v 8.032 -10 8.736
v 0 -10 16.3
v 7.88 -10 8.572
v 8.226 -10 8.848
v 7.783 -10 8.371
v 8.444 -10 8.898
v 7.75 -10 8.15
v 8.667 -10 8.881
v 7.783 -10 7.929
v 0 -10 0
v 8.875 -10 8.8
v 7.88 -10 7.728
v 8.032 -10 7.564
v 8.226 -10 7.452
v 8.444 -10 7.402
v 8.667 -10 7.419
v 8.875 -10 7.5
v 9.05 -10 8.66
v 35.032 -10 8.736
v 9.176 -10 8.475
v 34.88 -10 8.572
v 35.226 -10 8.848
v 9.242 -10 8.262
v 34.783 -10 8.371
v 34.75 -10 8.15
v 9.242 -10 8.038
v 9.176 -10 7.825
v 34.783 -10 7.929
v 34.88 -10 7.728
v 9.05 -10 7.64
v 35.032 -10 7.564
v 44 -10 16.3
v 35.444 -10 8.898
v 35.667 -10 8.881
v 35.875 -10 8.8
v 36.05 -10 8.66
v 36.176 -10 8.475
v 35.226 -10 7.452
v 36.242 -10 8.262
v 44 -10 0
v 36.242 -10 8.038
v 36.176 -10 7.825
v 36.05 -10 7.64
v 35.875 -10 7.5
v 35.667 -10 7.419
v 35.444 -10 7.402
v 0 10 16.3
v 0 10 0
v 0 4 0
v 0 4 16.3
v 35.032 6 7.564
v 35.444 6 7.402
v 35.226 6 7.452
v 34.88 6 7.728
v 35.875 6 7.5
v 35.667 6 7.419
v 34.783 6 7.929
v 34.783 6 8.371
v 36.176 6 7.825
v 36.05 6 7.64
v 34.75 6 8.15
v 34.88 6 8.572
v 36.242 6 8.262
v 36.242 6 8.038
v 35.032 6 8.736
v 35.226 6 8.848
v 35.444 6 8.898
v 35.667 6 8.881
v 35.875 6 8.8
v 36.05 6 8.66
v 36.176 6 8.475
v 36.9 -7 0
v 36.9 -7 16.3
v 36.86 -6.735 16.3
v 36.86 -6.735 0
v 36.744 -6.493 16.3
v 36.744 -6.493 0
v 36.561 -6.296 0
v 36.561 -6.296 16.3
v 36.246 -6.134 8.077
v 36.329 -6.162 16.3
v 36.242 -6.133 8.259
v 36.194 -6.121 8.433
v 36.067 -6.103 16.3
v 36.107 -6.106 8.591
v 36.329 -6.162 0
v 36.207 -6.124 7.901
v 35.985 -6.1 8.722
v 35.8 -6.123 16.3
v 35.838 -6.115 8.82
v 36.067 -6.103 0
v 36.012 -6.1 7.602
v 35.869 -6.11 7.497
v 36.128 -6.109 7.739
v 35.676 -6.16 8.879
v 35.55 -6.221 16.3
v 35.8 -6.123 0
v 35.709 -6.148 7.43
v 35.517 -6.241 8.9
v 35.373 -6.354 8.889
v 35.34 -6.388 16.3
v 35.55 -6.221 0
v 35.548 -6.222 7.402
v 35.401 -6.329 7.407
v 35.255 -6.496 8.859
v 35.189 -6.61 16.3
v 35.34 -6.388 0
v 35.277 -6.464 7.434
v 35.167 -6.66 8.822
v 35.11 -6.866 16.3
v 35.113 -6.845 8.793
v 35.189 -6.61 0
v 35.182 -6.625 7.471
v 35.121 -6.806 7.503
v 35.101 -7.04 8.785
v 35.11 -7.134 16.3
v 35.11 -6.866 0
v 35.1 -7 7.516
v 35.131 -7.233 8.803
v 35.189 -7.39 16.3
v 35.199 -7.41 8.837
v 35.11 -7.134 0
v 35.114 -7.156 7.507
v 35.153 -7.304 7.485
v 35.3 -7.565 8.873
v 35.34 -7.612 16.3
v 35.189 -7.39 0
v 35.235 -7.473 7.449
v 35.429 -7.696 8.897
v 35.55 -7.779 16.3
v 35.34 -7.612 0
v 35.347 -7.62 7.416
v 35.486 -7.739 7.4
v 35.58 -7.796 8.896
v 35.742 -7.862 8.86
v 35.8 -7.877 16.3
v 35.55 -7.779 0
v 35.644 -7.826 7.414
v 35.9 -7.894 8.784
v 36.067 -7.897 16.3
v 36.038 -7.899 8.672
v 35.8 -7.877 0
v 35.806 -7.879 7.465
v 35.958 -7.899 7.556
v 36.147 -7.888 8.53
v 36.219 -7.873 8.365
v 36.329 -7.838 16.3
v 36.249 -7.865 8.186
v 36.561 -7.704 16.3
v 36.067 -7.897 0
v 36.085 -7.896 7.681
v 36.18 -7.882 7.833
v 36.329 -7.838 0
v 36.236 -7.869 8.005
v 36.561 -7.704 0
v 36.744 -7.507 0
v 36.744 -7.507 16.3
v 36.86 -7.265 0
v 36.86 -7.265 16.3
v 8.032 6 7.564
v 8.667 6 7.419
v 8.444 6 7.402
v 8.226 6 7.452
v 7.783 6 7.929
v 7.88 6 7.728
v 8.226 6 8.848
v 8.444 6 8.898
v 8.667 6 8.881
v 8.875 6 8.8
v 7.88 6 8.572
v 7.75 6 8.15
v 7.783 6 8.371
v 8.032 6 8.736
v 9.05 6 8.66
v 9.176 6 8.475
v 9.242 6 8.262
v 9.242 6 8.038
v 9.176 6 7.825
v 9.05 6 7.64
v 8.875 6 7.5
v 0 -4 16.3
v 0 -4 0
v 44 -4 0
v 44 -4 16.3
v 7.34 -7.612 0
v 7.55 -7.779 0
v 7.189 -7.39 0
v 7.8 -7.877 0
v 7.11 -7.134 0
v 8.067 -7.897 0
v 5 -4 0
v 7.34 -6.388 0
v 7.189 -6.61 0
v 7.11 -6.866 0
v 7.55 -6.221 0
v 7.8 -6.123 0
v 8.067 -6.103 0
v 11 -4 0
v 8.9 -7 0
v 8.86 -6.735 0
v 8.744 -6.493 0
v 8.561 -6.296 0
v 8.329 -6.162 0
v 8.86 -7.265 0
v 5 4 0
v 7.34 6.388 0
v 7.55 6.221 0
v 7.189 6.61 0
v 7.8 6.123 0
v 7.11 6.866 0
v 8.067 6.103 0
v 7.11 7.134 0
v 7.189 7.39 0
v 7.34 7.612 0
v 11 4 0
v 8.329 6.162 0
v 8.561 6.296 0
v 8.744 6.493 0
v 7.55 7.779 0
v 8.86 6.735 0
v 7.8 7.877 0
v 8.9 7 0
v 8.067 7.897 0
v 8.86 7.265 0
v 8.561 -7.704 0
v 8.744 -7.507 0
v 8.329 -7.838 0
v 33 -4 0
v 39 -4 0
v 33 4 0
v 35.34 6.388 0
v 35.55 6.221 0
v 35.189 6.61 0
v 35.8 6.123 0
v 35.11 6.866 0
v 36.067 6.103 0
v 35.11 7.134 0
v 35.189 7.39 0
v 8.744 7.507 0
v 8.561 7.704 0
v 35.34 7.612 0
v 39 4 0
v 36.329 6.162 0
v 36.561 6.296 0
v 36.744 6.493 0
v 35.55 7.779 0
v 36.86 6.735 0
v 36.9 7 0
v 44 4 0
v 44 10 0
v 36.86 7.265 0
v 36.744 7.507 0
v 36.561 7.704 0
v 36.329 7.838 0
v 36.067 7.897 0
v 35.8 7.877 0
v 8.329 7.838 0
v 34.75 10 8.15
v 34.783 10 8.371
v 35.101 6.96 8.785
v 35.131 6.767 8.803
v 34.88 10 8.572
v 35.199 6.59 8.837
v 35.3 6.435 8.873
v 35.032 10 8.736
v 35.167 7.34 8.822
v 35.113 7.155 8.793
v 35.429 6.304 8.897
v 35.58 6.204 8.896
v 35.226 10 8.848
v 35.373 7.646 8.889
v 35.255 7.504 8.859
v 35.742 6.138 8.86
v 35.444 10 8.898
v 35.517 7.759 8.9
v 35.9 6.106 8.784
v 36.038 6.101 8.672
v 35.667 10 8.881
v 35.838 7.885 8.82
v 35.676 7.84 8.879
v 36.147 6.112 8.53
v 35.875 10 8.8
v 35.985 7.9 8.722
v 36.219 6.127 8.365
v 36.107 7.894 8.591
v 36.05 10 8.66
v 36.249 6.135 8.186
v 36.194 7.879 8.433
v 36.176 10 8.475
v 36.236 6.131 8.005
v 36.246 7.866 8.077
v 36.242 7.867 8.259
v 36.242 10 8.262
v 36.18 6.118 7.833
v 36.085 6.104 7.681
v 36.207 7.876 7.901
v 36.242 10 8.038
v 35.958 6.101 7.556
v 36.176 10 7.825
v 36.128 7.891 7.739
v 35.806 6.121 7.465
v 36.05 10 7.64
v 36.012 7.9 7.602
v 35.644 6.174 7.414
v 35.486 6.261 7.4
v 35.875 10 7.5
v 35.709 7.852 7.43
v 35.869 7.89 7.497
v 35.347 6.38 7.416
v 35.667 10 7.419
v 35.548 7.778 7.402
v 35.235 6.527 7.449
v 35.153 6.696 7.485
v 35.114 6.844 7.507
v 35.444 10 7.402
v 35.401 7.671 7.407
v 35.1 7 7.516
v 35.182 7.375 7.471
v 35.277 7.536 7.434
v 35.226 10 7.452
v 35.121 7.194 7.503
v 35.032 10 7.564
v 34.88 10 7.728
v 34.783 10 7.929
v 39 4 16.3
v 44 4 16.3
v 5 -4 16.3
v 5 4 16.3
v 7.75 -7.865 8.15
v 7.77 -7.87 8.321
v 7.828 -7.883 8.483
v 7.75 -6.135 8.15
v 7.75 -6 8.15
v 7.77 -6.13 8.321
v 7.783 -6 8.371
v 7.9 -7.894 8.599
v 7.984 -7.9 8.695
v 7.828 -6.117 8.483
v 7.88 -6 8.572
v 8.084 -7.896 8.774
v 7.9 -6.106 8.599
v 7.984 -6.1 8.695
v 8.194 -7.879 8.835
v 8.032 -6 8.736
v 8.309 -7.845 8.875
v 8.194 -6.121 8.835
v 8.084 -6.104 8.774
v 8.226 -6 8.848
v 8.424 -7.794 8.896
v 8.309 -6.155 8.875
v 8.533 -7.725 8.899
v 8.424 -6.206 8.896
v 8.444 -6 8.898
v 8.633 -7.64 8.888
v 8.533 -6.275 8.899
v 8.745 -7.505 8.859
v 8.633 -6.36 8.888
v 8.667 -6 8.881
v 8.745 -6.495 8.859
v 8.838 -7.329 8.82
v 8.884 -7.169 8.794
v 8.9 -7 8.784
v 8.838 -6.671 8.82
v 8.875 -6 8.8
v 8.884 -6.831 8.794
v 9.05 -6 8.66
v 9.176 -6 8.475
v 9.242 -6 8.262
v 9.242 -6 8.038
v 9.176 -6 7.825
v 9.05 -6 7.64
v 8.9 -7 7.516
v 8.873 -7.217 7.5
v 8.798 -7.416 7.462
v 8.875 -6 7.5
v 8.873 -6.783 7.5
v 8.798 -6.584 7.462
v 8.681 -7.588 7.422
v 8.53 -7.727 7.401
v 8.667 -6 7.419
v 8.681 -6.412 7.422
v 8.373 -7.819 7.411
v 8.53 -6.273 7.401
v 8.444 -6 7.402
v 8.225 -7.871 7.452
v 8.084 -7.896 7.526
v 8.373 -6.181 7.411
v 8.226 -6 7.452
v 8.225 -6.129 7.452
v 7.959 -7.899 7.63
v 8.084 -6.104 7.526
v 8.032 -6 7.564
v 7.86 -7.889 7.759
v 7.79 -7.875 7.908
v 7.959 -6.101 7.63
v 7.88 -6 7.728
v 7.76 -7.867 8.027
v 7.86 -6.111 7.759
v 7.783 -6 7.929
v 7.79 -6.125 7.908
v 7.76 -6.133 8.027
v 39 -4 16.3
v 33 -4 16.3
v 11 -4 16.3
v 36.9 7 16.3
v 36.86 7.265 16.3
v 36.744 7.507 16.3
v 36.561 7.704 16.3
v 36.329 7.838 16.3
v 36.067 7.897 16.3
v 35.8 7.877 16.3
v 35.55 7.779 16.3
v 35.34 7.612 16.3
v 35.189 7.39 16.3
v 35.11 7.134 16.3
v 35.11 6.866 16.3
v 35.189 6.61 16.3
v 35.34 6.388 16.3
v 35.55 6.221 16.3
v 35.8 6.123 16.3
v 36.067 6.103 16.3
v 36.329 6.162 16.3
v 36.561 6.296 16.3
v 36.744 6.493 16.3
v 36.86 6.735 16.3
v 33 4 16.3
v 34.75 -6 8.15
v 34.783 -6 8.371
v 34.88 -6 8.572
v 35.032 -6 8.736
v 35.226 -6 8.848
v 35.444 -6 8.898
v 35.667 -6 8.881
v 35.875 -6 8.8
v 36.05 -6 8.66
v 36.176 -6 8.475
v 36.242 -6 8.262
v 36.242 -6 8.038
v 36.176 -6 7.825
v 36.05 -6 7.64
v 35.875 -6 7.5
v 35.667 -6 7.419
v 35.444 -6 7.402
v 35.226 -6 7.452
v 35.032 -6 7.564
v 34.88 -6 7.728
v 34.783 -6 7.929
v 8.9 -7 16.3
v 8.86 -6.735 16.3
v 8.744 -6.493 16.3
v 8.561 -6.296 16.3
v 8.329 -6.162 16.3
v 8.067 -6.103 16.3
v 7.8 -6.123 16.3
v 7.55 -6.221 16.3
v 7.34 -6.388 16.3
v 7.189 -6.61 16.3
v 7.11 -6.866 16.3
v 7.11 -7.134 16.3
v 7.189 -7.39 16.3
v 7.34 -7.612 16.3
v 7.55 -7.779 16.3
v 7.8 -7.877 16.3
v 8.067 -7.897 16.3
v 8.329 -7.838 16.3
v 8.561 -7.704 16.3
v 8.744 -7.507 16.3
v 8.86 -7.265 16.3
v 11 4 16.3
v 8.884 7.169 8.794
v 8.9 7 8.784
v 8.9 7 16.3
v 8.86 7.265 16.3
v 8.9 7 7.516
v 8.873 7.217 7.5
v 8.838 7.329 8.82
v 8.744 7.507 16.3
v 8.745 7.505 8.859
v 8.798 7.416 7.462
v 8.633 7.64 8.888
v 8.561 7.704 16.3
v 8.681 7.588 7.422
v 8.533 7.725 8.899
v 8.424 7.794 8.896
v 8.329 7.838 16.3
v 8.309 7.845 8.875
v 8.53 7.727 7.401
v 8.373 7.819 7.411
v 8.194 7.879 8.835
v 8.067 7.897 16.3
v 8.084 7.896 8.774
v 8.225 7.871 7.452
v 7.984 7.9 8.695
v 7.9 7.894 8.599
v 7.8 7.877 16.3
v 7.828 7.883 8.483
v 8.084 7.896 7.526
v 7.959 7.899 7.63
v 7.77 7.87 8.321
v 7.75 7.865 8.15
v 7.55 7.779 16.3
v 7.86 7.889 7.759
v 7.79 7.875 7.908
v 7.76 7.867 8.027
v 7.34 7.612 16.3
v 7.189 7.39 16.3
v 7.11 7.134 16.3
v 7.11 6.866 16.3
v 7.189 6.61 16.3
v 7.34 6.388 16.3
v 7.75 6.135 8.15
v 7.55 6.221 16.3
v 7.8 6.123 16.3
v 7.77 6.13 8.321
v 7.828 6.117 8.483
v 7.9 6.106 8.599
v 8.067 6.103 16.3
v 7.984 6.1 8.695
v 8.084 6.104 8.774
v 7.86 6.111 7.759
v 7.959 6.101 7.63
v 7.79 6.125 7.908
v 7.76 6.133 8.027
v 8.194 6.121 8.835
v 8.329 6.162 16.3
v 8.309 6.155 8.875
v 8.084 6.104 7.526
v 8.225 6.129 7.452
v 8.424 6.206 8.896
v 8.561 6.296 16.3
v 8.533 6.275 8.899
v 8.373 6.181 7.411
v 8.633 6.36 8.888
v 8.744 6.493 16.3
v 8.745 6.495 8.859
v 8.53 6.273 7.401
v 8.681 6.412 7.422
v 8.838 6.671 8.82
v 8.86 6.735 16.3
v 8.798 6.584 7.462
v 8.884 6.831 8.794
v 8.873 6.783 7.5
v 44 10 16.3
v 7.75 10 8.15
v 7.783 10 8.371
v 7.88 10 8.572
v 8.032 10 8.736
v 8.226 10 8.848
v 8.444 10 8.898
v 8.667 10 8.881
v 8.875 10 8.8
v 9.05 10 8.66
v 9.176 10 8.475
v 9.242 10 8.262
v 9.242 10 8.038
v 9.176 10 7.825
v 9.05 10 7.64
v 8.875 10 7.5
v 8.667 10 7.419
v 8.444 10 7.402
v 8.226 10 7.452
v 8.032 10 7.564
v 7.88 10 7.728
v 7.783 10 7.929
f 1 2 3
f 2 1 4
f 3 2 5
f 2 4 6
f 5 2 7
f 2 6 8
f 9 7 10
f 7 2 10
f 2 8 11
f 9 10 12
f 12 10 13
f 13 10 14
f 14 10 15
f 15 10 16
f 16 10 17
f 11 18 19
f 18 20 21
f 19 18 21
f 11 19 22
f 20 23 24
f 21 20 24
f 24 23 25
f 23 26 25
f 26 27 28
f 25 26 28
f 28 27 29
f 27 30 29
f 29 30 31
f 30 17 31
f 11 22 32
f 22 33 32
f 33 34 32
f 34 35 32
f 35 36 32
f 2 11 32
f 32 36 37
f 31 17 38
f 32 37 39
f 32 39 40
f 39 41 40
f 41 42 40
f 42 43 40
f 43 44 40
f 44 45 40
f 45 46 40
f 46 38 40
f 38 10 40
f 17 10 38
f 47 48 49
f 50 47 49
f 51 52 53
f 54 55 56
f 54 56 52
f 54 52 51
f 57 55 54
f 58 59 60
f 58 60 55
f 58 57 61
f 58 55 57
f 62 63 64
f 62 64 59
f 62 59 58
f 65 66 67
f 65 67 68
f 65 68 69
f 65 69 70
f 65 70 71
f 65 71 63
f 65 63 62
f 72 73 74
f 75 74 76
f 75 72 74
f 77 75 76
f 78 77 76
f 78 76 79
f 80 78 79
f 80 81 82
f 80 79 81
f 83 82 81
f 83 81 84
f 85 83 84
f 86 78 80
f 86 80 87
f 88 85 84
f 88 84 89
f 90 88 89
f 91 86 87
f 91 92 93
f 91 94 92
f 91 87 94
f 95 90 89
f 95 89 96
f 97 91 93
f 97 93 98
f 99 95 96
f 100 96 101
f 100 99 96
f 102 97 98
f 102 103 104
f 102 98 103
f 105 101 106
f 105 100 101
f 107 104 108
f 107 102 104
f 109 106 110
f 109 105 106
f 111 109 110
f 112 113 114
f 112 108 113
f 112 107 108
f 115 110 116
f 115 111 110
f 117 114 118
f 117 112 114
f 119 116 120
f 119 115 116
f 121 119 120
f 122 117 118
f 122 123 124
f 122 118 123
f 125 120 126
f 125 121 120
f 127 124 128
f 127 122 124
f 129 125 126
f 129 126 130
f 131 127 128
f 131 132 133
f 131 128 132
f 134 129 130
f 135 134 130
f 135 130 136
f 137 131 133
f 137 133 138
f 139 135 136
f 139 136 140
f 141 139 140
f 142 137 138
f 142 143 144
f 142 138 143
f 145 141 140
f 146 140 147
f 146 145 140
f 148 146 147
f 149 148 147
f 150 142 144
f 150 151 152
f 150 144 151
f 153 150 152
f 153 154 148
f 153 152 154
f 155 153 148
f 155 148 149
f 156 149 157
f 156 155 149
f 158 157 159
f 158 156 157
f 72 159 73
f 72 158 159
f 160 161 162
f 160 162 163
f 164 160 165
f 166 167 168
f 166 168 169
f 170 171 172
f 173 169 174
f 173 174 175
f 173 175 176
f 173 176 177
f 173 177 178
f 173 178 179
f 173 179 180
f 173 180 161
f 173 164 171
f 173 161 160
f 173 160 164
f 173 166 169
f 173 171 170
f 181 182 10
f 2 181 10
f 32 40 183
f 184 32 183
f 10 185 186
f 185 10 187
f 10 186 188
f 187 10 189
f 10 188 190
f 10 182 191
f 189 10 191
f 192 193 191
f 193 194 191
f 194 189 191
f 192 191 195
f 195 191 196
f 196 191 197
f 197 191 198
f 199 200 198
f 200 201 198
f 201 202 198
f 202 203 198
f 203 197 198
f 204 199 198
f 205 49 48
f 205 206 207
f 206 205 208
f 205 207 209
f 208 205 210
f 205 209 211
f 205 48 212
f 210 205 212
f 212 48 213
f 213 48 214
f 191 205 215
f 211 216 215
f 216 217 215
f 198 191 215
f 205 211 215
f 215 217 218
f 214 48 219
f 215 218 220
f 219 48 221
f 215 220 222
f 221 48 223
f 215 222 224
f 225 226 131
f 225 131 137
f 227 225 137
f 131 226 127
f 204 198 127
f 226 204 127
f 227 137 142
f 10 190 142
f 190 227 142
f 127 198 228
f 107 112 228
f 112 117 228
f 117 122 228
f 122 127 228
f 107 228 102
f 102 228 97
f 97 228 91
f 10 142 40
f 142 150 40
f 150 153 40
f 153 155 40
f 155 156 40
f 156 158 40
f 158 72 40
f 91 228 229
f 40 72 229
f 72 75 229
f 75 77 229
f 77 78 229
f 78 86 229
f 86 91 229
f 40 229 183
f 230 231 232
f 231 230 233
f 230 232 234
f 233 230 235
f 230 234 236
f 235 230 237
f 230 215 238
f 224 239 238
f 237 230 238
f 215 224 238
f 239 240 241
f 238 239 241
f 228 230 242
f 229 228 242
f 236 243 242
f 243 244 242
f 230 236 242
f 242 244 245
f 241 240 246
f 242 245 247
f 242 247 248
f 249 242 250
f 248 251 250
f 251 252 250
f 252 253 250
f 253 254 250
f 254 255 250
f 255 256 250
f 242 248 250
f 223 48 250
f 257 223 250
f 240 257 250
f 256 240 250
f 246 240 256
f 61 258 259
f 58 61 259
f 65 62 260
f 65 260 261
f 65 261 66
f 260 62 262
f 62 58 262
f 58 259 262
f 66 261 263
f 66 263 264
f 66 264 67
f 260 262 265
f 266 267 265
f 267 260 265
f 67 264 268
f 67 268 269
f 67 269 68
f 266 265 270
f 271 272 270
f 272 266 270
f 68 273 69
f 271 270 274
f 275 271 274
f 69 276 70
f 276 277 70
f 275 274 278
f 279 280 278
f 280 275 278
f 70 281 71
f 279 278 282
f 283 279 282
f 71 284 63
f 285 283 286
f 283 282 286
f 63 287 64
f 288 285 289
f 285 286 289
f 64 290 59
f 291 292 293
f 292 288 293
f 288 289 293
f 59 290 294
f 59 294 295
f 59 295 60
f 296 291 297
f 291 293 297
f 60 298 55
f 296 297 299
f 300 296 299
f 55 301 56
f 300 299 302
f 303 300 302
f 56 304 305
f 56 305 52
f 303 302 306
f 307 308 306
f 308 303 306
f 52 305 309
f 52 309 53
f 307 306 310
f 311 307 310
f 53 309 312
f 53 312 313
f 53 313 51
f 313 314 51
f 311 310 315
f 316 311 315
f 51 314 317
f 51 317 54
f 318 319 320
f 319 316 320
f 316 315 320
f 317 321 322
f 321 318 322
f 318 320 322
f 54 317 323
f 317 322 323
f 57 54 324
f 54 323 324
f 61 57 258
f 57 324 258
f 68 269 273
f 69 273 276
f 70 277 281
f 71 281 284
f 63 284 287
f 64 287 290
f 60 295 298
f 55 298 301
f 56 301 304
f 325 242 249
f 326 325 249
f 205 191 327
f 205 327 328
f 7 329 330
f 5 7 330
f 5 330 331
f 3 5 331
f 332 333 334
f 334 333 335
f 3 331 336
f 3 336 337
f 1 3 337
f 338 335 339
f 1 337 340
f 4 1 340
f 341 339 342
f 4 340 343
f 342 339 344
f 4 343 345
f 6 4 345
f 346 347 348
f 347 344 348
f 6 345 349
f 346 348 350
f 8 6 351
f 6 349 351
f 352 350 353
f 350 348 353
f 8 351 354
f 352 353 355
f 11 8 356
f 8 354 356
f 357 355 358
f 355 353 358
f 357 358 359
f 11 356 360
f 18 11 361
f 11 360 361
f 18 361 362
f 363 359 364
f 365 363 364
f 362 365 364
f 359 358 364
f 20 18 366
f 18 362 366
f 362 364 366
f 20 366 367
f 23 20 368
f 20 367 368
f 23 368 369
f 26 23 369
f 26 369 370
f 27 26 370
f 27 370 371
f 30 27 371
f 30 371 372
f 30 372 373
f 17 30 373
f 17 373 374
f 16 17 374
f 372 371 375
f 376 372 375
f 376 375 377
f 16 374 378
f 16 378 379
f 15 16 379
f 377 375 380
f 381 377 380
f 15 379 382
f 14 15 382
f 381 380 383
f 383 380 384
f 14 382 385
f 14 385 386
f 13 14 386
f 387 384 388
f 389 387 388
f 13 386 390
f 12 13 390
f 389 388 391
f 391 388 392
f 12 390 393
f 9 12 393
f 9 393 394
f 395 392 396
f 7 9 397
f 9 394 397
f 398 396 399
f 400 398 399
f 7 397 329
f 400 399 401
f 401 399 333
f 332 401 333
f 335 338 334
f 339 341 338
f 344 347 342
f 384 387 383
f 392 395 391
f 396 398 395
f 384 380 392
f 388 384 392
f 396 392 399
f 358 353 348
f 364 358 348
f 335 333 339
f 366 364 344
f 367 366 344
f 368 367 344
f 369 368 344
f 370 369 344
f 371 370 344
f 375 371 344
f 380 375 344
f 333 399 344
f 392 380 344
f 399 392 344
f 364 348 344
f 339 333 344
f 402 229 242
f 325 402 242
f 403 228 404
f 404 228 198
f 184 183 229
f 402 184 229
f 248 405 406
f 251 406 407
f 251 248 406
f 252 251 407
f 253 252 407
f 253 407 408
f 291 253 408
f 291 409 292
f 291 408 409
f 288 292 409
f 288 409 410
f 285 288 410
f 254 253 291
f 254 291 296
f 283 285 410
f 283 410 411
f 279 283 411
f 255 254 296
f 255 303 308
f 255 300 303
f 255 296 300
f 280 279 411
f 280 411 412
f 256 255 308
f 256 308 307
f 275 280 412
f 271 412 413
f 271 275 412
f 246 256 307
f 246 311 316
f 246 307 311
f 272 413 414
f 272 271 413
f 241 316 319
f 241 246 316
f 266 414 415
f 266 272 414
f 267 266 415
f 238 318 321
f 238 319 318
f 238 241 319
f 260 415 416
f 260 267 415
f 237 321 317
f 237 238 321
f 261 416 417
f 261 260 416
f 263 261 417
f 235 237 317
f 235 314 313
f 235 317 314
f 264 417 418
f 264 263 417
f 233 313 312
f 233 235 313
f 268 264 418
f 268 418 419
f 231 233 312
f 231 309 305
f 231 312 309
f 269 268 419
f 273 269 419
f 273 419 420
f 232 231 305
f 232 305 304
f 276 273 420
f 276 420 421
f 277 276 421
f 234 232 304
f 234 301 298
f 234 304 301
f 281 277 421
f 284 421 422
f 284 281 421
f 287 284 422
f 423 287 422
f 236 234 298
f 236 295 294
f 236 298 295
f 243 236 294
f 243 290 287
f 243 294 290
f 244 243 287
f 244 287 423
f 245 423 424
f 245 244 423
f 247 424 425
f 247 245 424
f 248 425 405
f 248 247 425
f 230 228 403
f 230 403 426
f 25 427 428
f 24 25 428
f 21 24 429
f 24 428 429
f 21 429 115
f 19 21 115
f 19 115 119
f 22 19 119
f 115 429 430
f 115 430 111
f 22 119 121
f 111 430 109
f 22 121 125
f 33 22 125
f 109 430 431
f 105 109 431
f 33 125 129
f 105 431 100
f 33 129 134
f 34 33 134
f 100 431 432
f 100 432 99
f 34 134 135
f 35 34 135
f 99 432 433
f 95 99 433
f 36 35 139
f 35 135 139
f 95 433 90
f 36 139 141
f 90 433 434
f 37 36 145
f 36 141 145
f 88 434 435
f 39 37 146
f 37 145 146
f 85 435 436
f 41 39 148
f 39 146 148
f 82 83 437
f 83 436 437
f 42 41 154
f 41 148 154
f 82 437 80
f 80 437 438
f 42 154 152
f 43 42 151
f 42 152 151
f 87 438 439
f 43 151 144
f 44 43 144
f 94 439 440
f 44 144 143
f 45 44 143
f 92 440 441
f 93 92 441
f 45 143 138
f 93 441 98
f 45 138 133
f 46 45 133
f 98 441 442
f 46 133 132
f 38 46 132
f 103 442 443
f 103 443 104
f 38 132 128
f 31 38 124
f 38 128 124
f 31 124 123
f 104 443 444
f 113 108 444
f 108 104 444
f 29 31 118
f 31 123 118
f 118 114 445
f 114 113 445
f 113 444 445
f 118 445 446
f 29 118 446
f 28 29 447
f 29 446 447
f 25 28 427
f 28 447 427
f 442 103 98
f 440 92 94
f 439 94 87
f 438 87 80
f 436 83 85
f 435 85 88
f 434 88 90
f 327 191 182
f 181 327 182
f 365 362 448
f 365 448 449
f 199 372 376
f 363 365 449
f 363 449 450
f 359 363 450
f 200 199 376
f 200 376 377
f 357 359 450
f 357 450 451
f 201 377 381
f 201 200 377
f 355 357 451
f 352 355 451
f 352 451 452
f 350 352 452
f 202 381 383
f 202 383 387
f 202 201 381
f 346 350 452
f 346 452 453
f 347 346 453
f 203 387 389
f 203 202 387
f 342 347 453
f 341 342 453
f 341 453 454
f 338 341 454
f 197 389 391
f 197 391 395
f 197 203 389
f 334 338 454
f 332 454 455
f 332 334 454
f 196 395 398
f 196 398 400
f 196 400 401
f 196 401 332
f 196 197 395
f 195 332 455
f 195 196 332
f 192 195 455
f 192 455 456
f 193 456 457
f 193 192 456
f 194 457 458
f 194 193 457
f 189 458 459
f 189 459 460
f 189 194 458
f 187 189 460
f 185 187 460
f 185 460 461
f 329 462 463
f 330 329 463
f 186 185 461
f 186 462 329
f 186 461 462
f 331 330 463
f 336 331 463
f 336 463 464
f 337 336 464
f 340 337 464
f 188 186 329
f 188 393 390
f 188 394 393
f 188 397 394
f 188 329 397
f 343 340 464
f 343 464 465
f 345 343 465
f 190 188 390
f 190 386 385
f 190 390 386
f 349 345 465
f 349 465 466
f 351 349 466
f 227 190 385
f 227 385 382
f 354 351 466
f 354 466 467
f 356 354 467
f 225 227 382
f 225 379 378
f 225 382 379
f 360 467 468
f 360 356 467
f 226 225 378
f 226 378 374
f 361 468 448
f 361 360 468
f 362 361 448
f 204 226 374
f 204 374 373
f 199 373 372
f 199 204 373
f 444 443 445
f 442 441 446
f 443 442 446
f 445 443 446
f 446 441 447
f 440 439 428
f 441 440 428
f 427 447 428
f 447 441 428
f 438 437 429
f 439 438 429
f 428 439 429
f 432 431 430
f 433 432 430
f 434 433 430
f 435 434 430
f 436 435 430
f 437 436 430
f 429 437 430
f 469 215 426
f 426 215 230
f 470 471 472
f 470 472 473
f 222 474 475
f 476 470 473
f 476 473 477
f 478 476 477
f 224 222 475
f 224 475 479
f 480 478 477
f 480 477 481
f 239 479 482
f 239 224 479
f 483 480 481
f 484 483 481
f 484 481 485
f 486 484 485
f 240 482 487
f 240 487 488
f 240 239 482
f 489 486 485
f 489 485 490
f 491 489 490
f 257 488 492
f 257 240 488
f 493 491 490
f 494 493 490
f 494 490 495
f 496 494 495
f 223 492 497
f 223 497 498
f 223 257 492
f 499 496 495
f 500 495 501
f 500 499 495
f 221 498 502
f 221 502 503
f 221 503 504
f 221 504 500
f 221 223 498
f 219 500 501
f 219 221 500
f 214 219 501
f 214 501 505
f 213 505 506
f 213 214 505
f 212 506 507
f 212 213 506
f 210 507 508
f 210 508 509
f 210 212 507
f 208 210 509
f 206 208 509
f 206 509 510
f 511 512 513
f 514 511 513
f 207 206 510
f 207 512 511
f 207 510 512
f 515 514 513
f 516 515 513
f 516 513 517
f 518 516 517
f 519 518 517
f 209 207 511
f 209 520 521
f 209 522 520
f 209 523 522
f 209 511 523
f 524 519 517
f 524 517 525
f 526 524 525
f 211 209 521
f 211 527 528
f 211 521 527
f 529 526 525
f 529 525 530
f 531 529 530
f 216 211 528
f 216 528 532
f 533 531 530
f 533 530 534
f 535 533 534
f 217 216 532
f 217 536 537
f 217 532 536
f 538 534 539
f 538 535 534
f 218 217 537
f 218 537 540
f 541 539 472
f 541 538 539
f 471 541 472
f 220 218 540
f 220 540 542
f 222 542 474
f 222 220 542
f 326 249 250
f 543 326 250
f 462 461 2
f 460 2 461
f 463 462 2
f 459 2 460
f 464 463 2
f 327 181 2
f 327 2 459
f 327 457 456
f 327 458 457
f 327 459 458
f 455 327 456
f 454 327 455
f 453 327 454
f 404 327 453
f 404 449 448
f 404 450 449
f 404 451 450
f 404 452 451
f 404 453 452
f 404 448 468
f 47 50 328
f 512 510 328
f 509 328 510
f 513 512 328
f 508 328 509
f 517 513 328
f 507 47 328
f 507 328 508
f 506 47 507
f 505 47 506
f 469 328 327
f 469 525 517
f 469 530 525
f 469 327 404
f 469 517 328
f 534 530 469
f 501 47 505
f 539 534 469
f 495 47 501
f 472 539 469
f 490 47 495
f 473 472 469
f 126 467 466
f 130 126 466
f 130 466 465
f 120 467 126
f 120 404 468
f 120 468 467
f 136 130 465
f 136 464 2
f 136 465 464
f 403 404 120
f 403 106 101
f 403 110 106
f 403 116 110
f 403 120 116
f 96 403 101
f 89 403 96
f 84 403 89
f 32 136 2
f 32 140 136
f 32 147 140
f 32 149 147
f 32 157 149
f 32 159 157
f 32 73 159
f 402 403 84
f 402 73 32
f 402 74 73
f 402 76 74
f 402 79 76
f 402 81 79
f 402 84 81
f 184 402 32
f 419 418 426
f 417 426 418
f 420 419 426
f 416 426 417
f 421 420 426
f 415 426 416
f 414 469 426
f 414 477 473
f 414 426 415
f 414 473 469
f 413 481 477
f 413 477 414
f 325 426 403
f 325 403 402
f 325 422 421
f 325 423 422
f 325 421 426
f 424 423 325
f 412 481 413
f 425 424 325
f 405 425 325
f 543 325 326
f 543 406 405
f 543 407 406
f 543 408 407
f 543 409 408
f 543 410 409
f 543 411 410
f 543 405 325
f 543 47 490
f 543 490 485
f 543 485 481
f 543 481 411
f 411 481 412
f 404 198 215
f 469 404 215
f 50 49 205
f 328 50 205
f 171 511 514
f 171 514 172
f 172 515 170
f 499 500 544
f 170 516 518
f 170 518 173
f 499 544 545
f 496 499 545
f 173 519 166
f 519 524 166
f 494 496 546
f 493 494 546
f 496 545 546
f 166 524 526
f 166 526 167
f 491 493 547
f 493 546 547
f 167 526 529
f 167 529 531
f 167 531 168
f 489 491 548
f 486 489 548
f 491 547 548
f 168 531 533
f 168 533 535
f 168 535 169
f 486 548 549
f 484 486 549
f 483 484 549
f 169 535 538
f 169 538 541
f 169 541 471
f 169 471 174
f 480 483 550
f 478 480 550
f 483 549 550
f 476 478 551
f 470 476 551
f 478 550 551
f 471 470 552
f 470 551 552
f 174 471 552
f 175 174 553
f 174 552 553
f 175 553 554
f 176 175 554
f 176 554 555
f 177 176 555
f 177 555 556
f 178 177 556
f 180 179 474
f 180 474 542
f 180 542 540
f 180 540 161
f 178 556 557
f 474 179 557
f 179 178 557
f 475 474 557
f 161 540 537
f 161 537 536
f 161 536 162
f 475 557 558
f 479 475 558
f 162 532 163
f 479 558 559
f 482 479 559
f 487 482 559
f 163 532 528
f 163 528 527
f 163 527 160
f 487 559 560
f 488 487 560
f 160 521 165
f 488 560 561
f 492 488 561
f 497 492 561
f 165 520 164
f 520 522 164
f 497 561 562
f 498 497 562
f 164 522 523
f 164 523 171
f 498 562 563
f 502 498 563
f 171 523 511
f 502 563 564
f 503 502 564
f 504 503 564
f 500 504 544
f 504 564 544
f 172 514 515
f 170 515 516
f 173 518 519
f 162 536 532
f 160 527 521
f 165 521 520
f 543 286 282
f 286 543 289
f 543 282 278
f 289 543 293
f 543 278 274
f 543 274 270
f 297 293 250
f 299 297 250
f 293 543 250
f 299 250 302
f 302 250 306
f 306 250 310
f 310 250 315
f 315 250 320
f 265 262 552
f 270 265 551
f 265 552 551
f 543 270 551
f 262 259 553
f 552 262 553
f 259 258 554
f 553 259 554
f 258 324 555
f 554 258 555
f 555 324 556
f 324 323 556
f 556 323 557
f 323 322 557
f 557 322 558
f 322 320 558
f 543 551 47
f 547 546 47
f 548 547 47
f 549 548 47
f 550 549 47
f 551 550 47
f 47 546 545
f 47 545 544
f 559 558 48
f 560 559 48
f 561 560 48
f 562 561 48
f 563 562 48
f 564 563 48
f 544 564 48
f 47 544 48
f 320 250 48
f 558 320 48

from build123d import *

# Parameters (mm, degrees)
SKETCH_1_R          = 0.9
SKETCH_1_W          = 6
SKETCH_1_H          = 8
EXTRUDE_1_DEPTH     = 16.3
SKETCH_2_R          = 0.75
CUT_EXTRUDE_1_DEPTH = 4
CUT_EXTRUDE_START   = -16
SKETCH_2_3_R        = 0.75
CUT_EXTRUDE_2_DEPTH = 4


with BuildPart() as part:
    # 草图1 → 凸台-拉伸1 (new body)
    # profile 1 of 4: a face of its own
    with BuildSketch(Plane.XY):
        Polygon((44, 10), (0, 10), (0, 4), (5, 4), (11, 4), (33, 4), (39, 4), (44, 4), align=None)
        with Locations((8, 7)):
            Circle(SKETCH_1_R, mode=Mode.SUBTRACT)
        with Locations((36, 7)):
            Circle(SKETCH_1_R, mode=Mode.SUBTRACT)
    # profile 2 of 4: a face of its own
    with BuildSketch(Plane.XY):
        Polygon((5, -4), (0, -4), (0, -10), (44, -10), (44, -4), (39, -4), (33, -4), (11, -4), align=None)
        with Locations((8, -7)):
            Circle(SKETCH_1_R, mode=Mode.SUBTRACT)
        with Locations((36, -7)):
            Circle(SKETCH_1_R, mode=Mode.SUBTRACT)
    # profile 3 of 4: a face of its own
    with BuildSketch(Plane.XY):
        with Locations((8, 0)):
            Rectangle(SKETCH_1_W, SKETCH_1_H)
    # profile 4 of 4: a face of its own
    with BuildSketch(Plane.XY):
        with Locations((36, 0)):
            Rectangle(SKETCH_1_W, SKETCH_1_H)
    extrude(amount=EXTRUDE_1_DEPTH)

    # 草图2 → 切除-拉伸1 (cut)
    with BuildSketch(Plane(origin=(0, 10, 0), x_dir=(1, 0, 0), z_dir=(0, 1, 0))):
        with Locations(Location((8.5, -8.15, 0), (0, 0, 180))):
            Circle(SKETCH_2_R)
        with Locations(Location((35.5, -8.15, 0), (0, 0, 180))):
            Circle(SKETCH_2_R)
    extrude(amount=-CUT_EXTRUDE_1_DEPTH, mode=Mode.SUBTRACT)

    # 草图2<3> → 切除-拉伸2 (cut)
    with BuildSketch(Plane(origin=(0, 10, 0), x_dir=(1, 0, 0), z_dir=(0, 1, 0)).offset(CUT_EXTRUDE_START)):
        with Locations(Location((8.5, -8.15, 0), (0, 0, 180))):
            Circle(SKETCH_2_3_R)
        with Locations(Location((35.5, -8.15, 0), (0, 0, 180))):
            Circle(SKETCH_2_3_R)
    extrude(amount=-CUT_EXTRUDE_2_DEPTH, mode=Mode.SUBTRACT)


solid = part.part
